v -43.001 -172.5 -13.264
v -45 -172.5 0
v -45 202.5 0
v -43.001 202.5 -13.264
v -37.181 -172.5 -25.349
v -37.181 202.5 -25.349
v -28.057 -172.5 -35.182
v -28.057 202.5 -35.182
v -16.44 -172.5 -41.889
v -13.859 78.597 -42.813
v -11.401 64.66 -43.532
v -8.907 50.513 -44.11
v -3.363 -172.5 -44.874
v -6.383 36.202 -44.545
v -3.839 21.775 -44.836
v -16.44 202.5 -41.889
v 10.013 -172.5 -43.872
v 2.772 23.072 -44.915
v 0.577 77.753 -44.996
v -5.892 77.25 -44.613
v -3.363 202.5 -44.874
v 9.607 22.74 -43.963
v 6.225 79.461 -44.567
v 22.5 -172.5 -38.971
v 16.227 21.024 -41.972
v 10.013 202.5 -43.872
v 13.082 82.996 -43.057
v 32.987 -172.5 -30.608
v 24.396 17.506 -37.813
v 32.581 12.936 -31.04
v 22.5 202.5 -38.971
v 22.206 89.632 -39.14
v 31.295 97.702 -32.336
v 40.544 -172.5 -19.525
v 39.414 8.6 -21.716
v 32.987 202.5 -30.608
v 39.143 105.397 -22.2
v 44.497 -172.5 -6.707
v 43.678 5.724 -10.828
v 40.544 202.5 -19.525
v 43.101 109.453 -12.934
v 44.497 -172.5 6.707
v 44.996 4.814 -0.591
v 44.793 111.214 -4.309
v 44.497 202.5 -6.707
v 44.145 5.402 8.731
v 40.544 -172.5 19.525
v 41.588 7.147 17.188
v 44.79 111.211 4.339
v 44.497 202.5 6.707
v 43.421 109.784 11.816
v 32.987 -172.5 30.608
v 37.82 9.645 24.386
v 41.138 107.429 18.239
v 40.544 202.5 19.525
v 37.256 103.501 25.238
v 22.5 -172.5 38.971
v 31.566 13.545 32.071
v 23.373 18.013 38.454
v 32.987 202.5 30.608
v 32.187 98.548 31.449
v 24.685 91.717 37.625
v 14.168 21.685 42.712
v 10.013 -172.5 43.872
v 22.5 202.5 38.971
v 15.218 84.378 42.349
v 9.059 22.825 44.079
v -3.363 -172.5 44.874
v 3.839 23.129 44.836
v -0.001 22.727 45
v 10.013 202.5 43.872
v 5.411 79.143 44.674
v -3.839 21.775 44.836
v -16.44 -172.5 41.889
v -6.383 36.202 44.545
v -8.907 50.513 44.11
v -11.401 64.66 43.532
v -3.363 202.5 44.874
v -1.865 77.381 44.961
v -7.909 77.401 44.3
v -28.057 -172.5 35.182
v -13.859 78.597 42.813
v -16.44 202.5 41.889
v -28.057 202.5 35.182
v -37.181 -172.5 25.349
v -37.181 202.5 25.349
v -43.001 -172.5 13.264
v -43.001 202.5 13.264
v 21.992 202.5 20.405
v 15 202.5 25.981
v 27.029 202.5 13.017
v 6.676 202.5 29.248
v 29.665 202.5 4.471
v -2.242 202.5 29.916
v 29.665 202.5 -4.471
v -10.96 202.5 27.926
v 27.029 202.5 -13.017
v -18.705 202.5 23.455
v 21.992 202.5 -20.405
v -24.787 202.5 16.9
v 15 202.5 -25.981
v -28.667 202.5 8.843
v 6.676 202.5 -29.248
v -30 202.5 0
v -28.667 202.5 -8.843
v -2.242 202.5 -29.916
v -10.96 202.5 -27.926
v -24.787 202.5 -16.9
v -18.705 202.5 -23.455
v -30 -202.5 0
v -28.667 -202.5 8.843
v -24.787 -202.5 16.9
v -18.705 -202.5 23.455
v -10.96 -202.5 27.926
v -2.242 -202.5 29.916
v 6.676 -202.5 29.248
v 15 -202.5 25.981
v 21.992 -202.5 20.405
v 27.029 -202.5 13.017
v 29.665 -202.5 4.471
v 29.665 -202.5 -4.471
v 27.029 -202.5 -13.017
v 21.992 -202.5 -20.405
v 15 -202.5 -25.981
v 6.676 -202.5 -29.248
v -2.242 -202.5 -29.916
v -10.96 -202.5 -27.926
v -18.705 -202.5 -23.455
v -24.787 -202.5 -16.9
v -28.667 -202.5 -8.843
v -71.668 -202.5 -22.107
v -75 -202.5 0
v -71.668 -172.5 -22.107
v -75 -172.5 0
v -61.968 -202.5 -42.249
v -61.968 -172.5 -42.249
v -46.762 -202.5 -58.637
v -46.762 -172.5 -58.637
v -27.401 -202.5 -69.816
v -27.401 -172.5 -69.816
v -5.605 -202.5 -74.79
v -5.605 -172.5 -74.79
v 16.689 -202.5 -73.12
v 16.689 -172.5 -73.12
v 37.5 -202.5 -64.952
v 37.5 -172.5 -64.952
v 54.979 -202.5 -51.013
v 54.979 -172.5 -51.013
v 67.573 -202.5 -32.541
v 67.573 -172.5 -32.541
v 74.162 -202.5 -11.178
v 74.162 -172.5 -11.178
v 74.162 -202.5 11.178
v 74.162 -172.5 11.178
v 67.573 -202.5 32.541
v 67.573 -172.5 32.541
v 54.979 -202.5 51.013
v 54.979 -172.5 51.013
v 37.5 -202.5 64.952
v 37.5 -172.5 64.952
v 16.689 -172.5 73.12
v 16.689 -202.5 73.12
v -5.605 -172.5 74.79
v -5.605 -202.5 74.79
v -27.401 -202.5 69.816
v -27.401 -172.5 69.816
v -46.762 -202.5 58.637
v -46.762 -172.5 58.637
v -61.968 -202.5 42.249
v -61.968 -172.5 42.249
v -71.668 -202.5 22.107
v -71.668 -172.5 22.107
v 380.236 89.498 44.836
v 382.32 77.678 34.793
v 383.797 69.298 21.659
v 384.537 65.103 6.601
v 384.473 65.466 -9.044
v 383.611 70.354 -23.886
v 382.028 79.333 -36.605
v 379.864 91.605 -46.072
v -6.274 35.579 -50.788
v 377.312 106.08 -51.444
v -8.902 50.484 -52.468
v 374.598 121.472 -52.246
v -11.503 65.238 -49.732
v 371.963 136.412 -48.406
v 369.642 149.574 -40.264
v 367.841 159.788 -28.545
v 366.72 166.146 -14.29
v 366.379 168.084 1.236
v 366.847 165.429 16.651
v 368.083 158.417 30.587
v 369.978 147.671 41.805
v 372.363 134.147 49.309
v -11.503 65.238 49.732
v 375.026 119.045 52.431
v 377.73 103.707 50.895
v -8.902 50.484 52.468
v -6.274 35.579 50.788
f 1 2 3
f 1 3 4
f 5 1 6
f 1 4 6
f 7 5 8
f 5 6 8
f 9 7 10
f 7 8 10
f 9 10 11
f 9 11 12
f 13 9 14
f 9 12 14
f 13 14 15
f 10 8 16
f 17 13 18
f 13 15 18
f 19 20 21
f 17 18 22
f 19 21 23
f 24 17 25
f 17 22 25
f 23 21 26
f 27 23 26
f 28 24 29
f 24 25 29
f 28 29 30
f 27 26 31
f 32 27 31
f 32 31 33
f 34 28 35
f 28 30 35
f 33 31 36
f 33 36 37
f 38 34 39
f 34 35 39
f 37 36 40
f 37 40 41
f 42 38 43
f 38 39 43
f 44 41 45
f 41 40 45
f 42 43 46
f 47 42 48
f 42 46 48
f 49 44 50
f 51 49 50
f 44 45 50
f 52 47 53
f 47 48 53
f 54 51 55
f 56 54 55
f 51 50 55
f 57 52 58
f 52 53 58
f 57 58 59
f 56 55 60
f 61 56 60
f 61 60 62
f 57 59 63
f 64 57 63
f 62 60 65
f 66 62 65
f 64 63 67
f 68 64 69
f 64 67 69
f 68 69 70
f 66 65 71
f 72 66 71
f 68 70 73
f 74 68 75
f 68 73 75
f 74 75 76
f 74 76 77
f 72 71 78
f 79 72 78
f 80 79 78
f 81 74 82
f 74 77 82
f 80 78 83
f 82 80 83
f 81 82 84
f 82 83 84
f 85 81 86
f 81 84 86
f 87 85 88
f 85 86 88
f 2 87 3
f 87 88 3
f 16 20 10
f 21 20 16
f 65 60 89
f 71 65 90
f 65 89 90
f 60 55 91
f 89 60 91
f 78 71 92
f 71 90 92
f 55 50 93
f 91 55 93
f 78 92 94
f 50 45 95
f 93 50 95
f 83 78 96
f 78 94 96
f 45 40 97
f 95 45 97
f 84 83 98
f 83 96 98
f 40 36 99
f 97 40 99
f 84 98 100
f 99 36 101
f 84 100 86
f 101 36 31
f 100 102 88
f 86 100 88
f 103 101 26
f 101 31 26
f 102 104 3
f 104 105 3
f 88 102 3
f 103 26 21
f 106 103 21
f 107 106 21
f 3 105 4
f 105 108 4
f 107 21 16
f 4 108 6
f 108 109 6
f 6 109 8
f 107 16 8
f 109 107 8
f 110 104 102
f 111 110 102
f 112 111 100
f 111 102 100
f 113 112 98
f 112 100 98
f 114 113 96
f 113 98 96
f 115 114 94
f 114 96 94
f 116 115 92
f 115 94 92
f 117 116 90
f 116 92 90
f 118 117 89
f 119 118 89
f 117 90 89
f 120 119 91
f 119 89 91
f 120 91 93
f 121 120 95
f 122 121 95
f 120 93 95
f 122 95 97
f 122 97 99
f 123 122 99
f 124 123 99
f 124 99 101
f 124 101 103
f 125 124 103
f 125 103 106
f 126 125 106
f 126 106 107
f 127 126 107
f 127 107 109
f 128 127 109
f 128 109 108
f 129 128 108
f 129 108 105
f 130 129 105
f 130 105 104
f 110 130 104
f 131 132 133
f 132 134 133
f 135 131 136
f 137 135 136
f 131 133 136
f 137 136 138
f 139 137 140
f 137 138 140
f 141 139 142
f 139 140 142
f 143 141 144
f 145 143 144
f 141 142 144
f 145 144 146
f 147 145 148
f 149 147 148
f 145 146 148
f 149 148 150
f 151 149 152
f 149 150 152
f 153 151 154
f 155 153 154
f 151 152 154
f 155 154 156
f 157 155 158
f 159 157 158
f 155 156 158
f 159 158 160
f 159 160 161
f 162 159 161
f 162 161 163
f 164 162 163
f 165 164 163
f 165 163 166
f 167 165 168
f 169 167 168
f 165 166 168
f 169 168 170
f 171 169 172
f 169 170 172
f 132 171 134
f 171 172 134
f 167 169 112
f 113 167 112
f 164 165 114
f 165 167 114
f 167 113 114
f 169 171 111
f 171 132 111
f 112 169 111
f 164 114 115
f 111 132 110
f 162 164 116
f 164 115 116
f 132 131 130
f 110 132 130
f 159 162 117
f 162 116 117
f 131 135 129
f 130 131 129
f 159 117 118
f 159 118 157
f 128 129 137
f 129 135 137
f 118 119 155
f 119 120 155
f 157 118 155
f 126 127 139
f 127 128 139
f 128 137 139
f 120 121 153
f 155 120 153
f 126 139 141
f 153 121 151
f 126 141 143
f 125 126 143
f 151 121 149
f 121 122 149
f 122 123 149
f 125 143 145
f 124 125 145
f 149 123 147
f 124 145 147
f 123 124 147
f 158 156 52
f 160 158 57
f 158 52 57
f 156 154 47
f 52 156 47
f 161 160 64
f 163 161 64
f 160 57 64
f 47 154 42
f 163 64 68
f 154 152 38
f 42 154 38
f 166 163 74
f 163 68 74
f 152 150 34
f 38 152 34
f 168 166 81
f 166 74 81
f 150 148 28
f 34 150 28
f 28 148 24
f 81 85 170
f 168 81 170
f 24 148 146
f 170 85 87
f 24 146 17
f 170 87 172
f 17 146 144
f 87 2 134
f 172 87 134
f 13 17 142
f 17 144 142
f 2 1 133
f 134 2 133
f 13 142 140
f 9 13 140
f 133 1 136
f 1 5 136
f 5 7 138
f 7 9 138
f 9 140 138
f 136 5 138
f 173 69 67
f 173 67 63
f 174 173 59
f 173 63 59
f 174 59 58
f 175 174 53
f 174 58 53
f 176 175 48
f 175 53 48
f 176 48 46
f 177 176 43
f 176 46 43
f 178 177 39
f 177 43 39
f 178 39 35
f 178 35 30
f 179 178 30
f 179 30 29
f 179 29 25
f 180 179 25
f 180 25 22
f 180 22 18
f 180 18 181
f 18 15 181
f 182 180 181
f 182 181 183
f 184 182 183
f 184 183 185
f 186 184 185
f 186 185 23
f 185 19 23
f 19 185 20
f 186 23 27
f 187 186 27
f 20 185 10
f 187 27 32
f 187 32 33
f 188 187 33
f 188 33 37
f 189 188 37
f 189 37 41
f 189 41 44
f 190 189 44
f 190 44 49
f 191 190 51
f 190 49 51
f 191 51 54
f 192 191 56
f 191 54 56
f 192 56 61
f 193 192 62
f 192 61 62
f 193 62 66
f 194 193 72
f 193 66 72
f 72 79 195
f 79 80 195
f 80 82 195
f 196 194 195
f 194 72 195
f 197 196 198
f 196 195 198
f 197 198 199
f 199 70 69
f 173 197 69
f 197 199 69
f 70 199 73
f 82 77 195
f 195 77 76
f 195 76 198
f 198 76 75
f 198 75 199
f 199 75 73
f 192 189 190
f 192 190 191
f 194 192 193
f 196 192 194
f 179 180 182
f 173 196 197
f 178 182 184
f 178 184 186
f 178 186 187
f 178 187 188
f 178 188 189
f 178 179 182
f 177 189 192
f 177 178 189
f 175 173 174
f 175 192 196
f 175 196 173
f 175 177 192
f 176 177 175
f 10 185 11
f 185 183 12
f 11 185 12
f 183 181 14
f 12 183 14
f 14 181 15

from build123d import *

# Parameters (mm, degrees)
SKETCH2_R           = 52.5
BOSS_EXTRUDE1_DEPTH = 390
SKETCH3_R           = 30
CUT_EXTRUDE1_DEPTH  = 564.537281534


with BuildPart() as part:
    # Sketch1 → Revolve1 (revolve)
    with BuildSketch(Plane.XY):
        Polygon((0, 202.5), (0, -202.5), (75, -202.5), (75, -172.5), (45, -172.5), (45, 202.5), align=None)
    revolve(axis=Axis((0, 202.5, 0), (0, -1, 0)))

    # Sketch2 → Boss-Extrude1 (add)
    with BuildSketch(Plane(origin=(0, 0, 0), x_dir=(0, 0, 1), z_dir=(0.984807753012208, 0.17364817766693072, 0))):
        with Locations((0, -49.423569985)):
            Circle(SKETCH2_R)
    extrude(amount=BOSS_EXTRUDE1_DEPTH)

    # Sketch3 → Cut-Extrude1 (cut, through all)
    with BuildSketch(Plane(origin=(0, 202.5, 0), x_dir=(1, 0, 0), z_dir=(0, 1, 0))):
        Circle(SKETCH3_R)
    extrude(amount=-CUT_EXTRUDE1_DEPTH, mode=Mode.SUBTRACT)


solid = part.part
